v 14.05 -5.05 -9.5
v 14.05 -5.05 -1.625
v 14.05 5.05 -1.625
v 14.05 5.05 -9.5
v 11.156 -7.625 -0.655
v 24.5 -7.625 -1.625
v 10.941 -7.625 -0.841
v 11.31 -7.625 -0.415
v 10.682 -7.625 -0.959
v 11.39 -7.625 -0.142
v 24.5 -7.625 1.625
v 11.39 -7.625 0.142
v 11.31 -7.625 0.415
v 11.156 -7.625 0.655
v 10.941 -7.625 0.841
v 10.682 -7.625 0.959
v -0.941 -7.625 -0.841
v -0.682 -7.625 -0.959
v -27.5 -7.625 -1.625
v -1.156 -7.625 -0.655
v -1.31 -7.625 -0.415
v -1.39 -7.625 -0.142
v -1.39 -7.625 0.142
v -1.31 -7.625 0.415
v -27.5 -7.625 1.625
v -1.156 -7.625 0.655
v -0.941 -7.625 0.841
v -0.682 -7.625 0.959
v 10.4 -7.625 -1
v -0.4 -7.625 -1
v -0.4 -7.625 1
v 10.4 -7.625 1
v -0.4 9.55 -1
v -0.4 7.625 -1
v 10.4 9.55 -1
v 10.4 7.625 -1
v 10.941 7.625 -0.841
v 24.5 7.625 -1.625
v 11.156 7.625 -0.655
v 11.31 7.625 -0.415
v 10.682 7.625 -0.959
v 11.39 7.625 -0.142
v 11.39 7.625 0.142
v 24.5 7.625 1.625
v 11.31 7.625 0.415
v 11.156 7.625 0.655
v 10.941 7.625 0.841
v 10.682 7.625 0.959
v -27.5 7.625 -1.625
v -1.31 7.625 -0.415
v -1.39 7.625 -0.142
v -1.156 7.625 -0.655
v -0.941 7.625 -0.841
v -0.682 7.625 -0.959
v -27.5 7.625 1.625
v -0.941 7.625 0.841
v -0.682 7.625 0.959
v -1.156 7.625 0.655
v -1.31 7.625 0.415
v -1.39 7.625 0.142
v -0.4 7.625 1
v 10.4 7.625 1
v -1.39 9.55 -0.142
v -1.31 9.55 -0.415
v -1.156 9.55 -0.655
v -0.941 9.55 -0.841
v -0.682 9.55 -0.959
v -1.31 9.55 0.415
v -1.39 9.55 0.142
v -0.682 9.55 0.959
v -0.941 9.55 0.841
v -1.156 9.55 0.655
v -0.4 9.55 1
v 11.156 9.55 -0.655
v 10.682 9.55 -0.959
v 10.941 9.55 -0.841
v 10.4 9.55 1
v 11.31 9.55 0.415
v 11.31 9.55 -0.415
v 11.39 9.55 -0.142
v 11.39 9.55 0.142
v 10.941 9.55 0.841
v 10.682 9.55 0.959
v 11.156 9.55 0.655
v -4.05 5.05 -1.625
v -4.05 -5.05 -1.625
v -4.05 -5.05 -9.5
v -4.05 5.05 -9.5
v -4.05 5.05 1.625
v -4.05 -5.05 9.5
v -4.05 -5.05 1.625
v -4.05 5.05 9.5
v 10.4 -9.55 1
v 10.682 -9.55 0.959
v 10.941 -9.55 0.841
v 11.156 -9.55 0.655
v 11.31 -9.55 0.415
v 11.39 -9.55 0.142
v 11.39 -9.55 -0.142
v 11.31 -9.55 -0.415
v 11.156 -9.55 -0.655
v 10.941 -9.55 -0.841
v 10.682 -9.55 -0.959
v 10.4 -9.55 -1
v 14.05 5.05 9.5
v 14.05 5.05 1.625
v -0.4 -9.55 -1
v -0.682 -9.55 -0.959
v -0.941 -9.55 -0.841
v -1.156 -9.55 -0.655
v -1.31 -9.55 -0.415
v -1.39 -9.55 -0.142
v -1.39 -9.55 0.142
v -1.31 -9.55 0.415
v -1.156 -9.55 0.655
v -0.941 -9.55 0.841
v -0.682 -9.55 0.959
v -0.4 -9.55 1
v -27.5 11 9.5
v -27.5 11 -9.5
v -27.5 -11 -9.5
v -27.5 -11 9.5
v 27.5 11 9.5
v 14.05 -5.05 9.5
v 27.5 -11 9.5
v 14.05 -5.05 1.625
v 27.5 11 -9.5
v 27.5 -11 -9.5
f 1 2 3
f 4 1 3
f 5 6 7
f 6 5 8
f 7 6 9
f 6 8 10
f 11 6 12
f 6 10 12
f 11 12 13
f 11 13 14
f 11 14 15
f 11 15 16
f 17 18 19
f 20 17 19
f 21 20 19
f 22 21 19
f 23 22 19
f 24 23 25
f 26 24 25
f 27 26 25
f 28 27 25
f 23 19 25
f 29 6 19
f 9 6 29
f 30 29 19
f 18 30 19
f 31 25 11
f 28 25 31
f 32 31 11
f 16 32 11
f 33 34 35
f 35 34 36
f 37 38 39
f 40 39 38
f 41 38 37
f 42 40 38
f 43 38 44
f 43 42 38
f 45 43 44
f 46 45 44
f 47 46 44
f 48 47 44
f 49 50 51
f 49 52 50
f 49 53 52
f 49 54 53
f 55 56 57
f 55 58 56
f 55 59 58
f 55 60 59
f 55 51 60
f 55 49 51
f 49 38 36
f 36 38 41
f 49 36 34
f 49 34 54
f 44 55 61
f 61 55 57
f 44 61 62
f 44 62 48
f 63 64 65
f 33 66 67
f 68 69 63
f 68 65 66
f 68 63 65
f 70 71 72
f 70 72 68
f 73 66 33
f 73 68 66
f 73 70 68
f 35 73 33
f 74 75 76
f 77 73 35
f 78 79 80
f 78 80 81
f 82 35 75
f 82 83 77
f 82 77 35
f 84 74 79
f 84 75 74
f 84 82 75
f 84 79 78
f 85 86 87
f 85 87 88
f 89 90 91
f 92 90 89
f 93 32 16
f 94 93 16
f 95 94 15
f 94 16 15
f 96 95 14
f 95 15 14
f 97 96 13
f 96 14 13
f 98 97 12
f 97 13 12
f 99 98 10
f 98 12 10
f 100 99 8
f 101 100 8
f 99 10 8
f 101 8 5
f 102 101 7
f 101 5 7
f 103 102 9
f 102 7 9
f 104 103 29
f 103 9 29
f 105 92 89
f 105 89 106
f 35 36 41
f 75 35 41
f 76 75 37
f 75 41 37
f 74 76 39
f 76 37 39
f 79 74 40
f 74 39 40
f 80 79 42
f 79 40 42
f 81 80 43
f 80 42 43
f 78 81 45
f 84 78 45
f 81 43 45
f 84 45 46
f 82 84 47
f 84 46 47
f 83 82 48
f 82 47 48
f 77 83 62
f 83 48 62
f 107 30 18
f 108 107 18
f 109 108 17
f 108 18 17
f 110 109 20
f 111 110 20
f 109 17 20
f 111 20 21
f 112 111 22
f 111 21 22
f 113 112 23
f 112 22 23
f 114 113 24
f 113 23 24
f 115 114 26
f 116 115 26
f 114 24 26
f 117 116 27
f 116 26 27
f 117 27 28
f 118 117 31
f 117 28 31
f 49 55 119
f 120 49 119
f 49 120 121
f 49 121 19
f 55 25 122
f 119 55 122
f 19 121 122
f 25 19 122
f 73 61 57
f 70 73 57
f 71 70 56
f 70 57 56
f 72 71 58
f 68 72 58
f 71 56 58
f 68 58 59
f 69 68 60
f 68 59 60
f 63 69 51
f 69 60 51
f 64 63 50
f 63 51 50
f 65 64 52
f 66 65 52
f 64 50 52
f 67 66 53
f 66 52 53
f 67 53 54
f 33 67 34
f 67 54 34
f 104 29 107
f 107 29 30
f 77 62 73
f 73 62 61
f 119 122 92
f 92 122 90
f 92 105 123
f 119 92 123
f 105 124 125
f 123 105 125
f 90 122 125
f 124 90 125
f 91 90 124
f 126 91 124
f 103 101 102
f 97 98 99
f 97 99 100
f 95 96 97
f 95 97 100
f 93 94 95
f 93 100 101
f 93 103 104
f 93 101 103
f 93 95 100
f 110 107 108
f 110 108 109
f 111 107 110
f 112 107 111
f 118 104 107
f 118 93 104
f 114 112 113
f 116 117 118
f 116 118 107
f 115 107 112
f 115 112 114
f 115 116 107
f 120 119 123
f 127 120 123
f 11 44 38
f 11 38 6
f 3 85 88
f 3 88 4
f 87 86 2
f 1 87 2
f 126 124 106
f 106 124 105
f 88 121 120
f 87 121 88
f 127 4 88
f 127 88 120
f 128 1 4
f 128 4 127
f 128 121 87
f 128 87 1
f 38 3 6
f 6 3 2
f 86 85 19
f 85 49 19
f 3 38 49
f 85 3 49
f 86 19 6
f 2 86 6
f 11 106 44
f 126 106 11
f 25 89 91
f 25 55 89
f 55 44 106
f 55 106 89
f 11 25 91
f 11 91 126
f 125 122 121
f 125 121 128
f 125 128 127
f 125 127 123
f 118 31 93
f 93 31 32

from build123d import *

# Parameters (mm, degrees)
F0_W     = 55
F0_H     = 19
F1_DEPTH = 11
F2_W     = 18.1
F2_H     = 10.1
F3_DEPTH = 11
F5_DEPTH = 4.5
F7_DEPTH = 4.5
F8_W     = 15.25
F8_H     = 3.25
F9_DEPTH = 52


with BuildPart() as f1:
    # F0 (on Front) → F1 (new body, symmetric)
    with BuildSketch(Plane.XZ):
        Rectangle(F0_W, F0_H)
    extrude(amount=F1_DEPTH, both=True)

    # F2 (on Top) → F3 (cut, symmetric)
    with BuildSketch(Plane.XY):
        with Locations((5, 0)):
            Rectangle(F2_W, F2_H)
    extrude(amount=F3_DEPTH, both=True, mode=Mode.SUBTRACT)

    # F4 (on face) → F5 (cut)
    with BuildSketch(Plane.XZ.offset(-5.05)):
        with BuildLine():
            Line((10.4, 1), (-0.4, 1))
            ThreePointArc((-0.4, 1), (-1.4, 0), (-0.4, -1))
            Line((-0.4, -1), (10.4, -1))
            ThreePointArc((10.4, -1), (11.4, 0), (10.4, 1))
        make_face()
    extrude(amount=-F5_DEPTH, mode=Mode.SUBTRACT)

    # F6 (on face) → F7 (cut)
    with BuildSketch(Plane(origin=(0, -5.05, 0), x_dir=(-1, 0, 0), z_dir=(0, 1, 0))):
        with BuildLine():
            ThreePointArc((-10.4, 1), (-11.4, 0), (-10.4, -1))
            Line((-10.4, -1), (0.4, -1))
            ThreePointArc((0.4, -1), (1.4, 0), (0.4, 1))
            Line((0.4, 1), (-10.4, 1))
        make_face()
    extrude(amount=-F7_DEPTH, mode=Mode.SUBTRACT)

    # F8 (on face) → F9 (cut)
    with BuildSketch(Plane(origin=(-27.5, 0, 0), x_dir=(0, -1, 0), z_dir=(-1, 0, 0))):
        Rectangle(F8_W, F8_H)
    extrude(amount=-F9_DEPTH, mode=Mode.SUBTRACT)


solid = f1.part
